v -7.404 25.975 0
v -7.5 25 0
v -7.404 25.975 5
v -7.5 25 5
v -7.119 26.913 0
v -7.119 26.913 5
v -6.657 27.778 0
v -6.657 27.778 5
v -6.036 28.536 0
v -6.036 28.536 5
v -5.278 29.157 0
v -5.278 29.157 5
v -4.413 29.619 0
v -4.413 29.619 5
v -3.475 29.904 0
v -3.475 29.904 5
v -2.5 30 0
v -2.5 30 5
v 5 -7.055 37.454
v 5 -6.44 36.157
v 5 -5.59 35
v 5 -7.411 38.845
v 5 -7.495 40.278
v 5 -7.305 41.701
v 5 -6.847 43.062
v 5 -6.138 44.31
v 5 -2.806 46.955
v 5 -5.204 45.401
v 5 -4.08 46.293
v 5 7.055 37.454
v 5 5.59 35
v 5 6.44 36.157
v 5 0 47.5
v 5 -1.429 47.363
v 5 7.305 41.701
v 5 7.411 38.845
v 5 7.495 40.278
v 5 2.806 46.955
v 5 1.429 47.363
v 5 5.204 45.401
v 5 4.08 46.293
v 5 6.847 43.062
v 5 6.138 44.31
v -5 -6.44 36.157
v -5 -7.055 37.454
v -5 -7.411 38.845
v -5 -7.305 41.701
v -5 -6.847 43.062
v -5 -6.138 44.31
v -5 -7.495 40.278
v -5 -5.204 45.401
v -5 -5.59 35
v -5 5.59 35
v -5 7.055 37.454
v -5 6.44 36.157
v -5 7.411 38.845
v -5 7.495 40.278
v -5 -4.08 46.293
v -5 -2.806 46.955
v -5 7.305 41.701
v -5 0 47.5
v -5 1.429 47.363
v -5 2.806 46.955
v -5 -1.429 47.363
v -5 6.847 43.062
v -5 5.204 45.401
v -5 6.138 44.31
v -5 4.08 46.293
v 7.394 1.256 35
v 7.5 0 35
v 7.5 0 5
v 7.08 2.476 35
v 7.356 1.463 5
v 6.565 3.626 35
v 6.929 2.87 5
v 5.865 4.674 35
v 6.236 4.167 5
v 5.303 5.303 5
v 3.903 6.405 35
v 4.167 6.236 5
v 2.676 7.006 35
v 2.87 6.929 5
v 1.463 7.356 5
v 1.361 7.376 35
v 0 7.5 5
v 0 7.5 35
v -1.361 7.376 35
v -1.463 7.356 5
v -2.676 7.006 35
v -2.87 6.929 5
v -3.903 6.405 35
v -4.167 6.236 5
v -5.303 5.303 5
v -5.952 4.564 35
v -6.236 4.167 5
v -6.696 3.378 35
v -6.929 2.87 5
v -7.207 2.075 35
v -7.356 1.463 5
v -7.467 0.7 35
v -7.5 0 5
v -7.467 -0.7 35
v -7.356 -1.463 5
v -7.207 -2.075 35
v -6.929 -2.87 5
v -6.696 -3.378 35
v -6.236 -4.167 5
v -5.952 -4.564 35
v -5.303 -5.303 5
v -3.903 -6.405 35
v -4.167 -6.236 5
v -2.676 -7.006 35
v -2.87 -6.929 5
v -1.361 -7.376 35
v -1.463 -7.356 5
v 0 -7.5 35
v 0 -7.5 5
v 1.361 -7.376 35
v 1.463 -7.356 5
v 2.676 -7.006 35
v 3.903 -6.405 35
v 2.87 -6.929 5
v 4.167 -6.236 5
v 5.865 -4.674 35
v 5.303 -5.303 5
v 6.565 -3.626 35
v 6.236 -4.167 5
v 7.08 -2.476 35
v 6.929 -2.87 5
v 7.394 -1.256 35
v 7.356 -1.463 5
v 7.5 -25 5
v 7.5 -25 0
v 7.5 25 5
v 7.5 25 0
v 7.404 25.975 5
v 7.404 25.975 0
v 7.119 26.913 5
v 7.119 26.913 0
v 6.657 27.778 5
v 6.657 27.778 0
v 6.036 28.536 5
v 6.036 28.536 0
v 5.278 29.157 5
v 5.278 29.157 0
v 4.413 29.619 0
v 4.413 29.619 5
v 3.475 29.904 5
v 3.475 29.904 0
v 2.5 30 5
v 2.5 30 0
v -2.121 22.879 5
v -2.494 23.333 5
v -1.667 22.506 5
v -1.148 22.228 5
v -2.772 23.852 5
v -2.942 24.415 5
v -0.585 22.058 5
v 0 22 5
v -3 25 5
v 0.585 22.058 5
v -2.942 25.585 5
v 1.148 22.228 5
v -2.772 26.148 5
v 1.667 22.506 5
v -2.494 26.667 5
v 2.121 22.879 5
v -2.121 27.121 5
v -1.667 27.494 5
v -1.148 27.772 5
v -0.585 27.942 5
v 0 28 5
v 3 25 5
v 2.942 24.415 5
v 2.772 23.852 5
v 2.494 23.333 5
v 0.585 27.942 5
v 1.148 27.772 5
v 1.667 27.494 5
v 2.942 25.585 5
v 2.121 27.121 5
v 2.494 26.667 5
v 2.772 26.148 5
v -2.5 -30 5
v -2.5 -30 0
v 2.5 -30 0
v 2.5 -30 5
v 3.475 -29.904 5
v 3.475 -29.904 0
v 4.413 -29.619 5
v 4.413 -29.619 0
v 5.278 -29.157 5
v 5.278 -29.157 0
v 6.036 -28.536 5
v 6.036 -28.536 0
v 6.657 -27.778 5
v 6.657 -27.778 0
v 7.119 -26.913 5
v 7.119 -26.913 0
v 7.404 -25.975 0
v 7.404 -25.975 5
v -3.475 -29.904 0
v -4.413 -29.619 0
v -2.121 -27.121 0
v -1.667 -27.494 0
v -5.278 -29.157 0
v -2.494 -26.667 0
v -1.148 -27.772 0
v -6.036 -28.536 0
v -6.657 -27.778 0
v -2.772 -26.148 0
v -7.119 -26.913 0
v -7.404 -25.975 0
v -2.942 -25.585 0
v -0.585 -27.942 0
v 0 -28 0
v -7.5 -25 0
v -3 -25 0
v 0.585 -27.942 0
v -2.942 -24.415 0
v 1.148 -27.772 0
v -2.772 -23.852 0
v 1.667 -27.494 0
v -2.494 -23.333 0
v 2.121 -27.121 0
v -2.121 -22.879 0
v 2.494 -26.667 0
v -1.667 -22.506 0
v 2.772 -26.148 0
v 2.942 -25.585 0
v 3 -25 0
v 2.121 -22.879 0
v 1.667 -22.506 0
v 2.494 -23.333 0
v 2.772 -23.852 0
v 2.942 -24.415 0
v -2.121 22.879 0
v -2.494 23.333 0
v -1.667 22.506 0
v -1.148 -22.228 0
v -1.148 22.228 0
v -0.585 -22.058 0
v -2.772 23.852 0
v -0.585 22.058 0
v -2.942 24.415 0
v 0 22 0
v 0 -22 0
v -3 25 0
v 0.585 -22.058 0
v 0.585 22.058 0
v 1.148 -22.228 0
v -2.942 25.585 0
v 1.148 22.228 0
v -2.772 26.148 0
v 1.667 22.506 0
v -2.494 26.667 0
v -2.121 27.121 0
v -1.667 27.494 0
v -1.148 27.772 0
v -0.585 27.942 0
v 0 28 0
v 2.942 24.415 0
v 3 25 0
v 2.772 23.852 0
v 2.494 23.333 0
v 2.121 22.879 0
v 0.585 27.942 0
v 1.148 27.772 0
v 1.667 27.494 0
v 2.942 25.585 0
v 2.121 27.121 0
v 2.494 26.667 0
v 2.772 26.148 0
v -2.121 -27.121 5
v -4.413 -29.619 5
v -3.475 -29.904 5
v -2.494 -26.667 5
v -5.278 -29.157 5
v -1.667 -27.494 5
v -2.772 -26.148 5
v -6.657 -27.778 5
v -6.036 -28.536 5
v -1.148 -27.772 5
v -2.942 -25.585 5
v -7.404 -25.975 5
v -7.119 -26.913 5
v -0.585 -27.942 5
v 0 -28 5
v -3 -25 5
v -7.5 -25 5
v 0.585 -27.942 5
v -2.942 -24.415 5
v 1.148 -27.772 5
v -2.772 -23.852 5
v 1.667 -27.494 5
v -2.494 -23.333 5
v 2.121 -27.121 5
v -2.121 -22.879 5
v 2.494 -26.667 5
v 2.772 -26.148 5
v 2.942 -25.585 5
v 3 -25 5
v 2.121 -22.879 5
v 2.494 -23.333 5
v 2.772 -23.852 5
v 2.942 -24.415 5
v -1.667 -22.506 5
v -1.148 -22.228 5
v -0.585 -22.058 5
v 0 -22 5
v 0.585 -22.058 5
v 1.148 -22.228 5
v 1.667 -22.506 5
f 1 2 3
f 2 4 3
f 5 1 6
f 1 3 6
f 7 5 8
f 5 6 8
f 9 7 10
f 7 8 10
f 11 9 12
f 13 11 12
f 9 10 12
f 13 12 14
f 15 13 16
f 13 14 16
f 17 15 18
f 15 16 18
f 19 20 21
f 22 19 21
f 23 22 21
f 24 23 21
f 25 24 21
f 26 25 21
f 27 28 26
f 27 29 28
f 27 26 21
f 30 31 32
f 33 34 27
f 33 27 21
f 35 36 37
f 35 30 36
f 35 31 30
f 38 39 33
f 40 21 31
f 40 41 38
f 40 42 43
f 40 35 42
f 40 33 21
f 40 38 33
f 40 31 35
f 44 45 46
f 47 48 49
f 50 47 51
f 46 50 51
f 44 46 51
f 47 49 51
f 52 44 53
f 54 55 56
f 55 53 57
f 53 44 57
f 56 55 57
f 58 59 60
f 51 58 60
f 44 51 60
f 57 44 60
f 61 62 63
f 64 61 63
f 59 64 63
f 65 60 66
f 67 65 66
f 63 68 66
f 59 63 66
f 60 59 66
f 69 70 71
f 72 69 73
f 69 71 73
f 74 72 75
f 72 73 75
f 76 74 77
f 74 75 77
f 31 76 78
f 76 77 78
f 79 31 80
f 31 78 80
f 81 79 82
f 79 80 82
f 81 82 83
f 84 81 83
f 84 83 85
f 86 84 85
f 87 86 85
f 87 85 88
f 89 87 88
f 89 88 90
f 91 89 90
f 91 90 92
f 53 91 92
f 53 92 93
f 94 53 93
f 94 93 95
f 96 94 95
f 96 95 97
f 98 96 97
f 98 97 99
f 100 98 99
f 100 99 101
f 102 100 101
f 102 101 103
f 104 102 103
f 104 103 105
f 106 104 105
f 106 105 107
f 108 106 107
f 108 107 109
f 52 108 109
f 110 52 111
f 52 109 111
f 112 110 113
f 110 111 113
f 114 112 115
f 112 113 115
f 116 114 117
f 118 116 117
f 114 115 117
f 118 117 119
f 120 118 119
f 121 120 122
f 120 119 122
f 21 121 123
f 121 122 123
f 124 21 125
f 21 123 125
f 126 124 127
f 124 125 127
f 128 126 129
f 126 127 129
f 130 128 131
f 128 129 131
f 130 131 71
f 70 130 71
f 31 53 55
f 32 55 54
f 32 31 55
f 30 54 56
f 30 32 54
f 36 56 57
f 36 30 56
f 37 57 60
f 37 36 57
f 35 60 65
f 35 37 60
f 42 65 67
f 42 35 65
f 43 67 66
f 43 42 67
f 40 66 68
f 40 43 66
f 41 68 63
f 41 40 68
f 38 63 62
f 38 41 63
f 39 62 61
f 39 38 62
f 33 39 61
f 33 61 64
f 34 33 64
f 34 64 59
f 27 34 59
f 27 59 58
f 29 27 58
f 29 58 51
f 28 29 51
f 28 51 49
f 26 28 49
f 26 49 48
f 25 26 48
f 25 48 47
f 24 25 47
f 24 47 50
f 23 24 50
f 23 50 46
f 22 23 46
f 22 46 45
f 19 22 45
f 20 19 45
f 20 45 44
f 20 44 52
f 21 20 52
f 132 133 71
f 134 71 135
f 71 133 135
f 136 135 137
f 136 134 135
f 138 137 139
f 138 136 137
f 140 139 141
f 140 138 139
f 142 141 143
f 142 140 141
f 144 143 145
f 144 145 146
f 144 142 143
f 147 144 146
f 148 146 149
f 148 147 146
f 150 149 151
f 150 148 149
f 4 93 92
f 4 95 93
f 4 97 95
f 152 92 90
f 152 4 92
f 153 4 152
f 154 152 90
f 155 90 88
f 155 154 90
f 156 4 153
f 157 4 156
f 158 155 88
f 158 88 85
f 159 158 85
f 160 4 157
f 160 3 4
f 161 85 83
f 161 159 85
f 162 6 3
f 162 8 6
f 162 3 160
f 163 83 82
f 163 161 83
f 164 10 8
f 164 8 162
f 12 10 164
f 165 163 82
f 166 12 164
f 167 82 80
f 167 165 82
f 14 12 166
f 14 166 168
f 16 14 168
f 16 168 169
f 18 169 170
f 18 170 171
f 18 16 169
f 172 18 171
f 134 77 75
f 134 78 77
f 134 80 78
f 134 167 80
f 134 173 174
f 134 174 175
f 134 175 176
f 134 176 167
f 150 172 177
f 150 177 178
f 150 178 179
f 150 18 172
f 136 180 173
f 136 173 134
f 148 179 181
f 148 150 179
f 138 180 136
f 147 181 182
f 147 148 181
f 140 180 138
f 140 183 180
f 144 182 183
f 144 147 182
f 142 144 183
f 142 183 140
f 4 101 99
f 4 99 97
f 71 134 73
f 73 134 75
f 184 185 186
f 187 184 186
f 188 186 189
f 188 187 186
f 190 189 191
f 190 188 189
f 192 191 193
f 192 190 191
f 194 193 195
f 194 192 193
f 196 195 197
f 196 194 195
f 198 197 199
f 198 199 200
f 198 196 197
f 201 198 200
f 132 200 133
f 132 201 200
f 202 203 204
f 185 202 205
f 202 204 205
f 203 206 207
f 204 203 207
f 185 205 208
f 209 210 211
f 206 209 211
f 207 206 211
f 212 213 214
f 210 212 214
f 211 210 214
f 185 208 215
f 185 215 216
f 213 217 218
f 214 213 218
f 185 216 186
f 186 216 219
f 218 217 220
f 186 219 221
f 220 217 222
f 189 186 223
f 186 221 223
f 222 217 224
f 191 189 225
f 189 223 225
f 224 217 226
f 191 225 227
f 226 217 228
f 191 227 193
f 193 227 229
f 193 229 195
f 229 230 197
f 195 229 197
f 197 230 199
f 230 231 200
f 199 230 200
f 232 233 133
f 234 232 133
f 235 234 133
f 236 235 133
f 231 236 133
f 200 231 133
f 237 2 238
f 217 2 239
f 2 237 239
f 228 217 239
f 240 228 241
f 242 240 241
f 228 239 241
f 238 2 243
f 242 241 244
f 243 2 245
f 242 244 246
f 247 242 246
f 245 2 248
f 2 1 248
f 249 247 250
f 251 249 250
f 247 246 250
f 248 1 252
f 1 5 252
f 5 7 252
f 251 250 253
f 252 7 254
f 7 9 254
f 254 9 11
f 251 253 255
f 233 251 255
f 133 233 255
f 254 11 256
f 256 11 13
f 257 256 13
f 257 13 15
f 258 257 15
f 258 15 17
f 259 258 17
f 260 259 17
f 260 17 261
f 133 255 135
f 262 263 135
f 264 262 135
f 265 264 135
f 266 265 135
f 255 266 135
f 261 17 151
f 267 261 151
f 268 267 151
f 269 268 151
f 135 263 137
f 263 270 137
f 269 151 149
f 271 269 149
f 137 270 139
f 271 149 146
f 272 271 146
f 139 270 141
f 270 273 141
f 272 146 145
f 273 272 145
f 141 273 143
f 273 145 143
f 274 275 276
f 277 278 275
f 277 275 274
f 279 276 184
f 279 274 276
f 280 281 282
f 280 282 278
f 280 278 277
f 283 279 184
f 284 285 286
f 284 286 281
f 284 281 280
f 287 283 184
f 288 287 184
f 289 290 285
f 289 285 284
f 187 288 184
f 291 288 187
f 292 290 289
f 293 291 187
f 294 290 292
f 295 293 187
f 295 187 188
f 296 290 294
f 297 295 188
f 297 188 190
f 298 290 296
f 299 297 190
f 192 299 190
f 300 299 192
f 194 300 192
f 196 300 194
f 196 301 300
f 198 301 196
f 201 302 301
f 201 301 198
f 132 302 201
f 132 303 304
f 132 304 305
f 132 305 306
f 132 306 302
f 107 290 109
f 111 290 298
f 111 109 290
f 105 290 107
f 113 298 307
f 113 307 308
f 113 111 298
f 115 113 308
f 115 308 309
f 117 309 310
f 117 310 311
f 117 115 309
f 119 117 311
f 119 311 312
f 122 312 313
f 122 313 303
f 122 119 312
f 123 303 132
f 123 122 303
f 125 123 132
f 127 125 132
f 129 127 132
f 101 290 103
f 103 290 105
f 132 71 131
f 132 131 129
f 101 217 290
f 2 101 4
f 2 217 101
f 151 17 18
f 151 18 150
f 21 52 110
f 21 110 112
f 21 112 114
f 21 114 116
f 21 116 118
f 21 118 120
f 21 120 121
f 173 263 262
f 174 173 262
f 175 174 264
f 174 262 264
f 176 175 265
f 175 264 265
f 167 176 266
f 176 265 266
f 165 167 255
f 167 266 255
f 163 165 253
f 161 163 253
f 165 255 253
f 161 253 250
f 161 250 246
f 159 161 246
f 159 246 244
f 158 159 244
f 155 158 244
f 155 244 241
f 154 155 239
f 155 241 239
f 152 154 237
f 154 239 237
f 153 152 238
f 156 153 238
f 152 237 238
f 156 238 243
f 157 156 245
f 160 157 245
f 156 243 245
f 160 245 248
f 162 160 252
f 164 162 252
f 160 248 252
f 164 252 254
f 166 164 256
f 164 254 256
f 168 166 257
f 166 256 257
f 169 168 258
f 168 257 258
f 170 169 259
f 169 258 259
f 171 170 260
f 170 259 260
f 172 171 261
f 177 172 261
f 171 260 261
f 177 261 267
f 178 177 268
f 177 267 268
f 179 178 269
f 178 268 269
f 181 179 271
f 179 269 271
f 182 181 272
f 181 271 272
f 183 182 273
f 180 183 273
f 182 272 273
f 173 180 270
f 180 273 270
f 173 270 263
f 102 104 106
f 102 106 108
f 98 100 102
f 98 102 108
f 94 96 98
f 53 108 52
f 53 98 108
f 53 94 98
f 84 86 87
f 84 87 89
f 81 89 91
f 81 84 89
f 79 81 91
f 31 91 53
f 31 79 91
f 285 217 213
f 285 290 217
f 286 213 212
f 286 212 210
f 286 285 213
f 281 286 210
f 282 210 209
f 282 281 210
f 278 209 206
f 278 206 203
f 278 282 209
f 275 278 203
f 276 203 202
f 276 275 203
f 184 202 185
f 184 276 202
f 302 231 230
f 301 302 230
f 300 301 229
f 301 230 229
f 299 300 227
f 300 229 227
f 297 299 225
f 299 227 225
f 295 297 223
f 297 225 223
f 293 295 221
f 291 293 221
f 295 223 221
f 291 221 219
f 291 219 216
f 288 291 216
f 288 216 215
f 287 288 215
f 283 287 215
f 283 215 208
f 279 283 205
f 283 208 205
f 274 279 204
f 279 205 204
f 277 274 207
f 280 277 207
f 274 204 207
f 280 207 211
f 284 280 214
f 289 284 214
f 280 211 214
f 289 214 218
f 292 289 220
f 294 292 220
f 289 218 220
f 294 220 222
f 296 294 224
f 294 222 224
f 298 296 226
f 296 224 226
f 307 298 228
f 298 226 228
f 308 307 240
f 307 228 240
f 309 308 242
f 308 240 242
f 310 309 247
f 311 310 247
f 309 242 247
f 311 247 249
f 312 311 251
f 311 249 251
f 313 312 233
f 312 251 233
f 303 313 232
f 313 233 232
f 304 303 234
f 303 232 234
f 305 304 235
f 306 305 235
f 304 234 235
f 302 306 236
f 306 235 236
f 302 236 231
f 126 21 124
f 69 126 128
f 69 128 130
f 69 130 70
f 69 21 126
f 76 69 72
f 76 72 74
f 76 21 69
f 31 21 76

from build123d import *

# Parameters (mm, degrees)
F0_W     = 15
F0_H     = 60
F1_DEPTH = 5
F2_R     = 5
F3_R     = 7.5
F4_DEPTH = 30
F5_R     = 3
F6_DEPTH = 5
F7_R     = 7.5
F8_DEPTH = 5


with BuildPart() as f1:
    # F0 (on Top) → F1 (new body)
    with BuildSketch(Plane.XY):
        Rectangle(F0_W, F0_H)
    extrude(amount=F1_DEPTH)

    # F2
    f2_edges = [f1.edges().sort_by_distance(p)[0] for p in [
        (-7.5, 30, 2.5),
        (7.5, 30, 2.5),
        (7.5, -30, 2.5),
        (-7.5, -30, 2.5),
    ]]
    fillet(f2_edges, radius=F2_R)

    # F3 (on face) → F4 (join)
    with BuildSketch(Plane.XY.offset(5)):
        Circle(F3_R)
    extrude(amount=F4_DEPTH)

    # F5 (on face) → F6 (cut, through all)
    with BuildSketch(Plane(origin=(0, 0, 0), x_dir=(1, 0, 0), z_dir=(0, 0, -1))):
        with Locations((0, -25)):
            Circle(F5_R)
        with Locations((0, 25)):
            Circle(F5_R)
    extrude(amount=-F6_DEPTH, mode=Mode.SUBTRACT)

    # F7 (on Right) → F8 (join, symmetric)
    with BuildSketch(Plane.YZ):
        with Locations((0, 40)):
            Circle(F7_R)
    extrude(amount=F8_DEPTH, both=True)


solid = f1.part
